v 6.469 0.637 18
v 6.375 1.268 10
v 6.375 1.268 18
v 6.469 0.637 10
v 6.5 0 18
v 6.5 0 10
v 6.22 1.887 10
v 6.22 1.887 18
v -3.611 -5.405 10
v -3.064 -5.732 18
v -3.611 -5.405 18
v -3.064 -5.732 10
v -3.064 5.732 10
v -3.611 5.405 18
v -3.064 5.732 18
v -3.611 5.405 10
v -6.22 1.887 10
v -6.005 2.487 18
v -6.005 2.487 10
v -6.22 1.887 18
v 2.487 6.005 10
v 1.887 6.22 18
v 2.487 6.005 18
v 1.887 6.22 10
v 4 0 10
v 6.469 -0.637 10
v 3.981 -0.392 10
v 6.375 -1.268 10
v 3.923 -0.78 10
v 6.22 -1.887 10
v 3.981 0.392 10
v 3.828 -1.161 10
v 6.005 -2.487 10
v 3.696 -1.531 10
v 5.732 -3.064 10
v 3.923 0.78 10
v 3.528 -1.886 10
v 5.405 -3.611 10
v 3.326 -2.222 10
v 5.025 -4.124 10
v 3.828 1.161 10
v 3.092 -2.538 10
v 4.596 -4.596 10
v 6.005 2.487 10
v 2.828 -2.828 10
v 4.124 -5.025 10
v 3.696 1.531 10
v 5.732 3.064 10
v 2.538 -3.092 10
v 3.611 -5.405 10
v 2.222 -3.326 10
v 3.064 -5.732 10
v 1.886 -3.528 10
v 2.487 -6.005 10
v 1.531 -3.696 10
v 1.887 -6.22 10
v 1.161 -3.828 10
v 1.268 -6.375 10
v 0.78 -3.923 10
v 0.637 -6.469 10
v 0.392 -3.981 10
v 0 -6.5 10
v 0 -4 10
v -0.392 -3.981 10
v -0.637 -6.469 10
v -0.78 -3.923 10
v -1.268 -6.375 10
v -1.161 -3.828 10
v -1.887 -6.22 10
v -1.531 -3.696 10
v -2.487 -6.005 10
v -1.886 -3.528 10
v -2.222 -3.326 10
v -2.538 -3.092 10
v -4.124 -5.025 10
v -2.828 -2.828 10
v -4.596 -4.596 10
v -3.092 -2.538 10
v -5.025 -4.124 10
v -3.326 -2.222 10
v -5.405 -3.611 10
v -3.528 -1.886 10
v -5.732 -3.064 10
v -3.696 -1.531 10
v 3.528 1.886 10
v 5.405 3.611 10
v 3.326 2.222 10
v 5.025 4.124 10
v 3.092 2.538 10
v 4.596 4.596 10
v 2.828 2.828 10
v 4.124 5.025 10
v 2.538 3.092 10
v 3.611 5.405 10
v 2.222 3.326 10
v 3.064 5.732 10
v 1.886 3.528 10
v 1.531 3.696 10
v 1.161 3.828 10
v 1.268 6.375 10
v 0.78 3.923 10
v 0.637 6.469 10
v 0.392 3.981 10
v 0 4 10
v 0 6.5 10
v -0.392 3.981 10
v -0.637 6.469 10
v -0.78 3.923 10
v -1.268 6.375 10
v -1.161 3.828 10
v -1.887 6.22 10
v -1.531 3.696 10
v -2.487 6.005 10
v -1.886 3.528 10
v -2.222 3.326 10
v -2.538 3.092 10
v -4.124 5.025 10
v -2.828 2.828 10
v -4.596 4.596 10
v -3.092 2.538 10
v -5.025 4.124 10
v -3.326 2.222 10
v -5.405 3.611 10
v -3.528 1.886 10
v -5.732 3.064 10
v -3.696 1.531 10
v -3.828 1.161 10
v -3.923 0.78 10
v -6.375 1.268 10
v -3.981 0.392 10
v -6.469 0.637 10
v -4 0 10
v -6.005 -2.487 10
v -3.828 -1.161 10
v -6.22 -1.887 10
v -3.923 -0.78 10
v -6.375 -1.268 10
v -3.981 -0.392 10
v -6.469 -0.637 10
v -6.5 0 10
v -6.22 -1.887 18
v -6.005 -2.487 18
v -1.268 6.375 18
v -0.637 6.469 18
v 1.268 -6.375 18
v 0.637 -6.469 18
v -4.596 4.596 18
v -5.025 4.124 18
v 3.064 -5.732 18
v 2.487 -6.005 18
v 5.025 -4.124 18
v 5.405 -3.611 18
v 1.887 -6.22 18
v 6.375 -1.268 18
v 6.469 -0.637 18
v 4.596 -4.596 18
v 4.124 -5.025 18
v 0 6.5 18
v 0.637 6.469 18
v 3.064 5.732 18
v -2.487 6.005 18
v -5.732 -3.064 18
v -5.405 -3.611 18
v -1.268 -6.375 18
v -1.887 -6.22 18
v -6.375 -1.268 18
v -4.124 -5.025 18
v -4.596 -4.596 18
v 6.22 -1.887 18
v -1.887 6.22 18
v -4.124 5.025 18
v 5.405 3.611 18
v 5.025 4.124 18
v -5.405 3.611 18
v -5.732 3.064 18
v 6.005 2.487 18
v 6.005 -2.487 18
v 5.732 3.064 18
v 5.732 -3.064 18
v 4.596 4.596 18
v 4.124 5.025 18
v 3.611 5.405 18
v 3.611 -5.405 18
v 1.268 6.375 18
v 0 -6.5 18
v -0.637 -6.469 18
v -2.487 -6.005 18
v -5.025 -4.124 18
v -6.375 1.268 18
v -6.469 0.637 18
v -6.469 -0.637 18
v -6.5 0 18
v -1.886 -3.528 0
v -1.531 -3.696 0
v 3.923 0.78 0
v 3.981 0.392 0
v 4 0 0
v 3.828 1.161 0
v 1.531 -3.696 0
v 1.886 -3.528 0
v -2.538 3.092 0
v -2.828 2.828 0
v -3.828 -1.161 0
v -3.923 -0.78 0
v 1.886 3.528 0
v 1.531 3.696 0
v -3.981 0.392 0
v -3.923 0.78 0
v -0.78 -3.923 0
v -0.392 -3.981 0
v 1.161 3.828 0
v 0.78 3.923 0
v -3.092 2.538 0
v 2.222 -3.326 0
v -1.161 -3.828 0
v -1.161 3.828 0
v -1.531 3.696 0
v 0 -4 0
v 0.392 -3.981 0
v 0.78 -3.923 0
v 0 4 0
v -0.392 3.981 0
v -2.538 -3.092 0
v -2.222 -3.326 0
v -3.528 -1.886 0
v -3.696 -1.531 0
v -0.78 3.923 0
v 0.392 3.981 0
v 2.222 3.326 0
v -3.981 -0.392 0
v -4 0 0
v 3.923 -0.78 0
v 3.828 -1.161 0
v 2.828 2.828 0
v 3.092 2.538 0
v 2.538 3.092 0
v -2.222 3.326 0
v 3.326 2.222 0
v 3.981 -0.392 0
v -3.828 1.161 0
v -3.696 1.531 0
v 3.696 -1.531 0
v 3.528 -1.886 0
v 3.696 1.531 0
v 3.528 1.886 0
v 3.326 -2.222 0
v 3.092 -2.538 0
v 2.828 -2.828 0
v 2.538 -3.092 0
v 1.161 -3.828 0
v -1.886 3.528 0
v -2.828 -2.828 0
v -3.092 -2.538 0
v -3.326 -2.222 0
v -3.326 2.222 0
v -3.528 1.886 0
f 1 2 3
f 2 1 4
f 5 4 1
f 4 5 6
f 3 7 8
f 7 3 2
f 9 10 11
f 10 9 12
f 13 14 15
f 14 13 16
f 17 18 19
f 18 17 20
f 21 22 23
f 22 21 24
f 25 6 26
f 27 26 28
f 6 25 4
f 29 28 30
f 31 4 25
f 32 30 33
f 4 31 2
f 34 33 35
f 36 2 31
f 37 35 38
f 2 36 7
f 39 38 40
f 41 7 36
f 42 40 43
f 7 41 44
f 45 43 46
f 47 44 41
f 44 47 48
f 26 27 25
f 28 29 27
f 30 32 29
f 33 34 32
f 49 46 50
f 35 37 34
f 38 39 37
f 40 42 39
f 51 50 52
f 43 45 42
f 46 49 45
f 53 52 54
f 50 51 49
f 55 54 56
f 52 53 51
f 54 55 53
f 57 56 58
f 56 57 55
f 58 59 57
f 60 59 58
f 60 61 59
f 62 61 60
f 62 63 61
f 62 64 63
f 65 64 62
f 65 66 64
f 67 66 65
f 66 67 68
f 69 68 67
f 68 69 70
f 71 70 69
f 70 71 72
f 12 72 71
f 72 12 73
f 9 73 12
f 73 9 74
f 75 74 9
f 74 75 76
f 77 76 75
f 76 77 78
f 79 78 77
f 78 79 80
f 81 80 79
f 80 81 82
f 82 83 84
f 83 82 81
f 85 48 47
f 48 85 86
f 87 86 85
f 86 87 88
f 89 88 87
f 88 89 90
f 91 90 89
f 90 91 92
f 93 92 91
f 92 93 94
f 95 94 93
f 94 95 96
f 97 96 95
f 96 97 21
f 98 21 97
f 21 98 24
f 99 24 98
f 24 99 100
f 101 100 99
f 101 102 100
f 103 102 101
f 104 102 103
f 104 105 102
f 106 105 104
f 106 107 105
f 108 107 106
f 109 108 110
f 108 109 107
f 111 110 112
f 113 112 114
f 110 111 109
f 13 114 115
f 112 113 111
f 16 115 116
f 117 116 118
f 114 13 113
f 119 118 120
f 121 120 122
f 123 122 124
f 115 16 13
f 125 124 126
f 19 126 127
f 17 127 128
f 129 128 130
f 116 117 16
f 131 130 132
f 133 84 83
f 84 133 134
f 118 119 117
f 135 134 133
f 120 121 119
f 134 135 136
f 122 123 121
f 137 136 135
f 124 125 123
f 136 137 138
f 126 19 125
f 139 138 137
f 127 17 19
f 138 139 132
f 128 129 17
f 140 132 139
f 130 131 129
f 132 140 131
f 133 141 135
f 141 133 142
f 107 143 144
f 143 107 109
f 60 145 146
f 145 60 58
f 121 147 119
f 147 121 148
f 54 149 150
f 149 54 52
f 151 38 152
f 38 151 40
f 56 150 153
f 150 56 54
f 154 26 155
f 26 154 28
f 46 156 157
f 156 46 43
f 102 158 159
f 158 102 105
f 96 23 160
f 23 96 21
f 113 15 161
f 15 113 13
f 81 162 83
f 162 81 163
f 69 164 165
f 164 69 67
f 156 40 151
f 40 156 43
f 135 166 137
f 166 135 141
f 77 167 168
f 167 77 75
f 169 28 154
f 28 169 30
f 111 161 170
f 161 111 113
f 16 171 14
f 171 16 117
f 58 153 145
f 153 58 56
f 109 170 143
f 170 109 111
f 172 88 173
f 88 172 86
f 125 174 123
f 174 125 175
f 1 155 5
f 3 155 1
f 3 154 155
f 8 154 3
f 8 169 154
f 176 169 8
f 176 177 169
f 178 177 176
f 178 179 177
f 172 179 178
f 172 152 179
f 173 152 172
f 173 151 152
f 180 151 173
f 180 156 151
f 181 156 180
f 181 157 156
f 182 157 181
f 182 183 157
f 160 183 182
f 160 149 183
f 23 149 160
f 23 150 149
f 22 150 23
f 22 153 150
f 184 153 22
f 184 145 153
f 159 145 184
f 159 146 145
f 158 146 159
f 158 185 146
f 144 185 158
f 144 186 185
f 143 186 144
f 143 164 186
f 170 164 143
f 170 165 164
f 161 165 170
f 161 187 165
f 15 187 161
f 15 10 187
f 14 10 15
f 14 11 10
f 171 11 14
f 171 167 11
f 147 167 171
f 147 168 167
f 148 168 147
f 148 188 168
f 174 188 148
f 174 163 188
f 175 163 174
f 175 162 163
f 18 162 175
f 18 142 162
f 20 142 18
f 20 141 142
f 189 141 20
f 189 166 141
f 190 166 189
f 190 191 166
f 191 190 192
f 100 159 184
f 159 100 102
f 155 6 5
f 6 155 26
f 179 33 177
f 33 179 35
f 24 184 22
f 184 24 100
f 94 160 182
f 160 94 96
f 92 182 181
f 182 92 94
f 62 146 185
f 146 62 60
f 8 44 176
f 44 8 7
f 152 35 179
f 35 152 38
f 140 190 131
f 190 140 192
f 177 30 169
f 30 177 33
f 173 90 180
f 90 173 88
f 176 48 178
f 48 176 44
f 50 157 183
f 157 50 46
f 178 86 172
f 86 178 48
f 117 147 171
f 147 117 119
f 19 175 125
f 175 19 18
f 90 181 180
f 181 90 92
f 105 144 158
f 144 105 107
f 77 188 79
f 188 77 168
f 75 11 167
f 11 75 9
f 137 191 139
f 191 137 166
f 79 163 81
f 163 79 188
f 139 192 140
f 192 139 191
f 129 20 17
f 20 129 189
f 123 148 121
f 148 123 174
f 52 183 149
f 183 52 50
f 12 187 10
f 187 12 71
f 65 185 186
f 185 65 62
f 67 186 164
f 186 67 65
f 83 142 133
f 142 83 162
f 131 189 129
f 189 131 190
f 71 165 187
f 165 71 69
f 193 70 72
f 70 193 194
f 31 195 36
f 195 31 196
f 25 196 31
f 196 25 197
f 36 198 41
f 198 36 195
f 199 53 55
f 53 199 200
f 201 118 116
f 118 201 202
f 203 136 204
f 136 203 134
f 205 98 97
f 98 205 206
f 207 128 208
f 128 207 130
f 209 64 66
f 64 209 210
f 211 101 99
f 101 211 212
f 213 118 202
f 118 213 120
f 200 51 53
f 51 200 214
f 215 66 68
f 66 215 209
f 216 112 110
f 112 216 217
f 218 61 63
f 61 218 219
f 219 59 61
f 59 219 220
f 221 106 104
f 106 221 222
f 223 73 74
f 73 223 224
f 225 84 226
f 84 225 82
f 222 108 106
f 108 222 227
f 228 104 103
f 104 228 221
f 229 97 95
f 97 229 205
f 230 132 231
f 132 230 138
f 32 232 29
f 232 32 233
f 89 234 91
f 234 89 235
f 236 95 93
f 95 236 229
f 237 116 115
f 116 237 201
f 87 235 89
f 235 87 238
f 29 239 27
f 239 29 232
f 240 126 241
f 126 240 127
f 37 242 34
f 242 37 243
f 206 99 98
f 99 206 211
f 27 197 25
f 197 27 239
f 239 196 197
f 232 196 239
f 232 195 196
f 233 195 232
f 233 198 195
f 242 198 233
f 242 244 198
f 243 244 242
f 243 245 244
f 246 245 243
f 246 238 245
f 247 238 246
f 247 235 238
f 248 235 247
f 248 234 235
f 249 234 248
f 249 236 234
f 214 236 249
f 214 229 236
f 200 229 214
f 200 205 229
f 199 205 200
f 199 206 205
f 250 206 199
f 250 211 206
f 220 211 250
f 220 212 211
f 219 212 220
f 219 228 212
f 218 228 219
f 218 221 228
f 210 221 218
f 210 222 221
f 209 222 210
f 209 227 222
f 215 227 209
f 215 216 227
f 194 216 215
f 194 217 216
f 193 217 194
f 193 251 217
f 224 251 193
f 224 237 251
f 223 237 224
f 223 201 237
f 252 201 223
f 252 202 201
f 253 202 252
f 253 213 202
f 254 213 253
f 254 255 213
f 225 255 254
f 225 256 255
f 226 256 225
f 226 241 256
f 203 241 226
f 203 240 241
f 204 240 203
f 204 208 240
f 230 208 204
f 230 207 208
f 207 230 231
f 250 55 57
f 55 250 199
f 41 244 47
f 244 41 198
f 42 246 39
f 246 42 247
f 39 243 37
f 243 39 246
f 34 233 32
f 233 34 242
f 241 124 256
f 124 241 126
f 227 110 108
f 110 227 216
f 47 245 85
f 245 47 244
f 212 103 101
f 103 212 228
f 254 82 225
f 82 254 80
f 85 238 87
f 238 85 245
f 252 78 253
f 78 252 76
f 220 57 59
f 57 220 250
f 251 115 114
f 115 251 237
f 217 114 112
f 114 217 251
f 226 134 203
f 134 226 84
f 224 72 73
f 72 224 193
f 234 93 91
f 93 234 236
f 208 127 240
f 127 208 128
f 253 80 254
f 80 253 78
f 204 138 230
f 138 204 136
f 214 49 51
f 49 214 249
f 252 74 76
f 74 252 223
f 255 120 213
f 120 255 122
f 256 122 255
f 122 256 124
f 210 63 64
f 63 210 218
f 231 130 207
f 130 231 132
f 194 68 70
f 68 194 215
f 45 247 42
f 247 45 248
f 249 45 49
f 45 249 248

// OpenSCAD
module socket_head_cap_screw() {
    union() {
        // Head of the screw
        translate([0, 0, 10])
            cylinder(h=8, d=13, $fn=64);
        
        // Shaft of the screw
        cylinder(h=10, d=8, $fn=64);
        
        // Hex socket
        translate([0, 0, 10])
            cylinder(h=8, d=6, $fn=6);
    }
}

socket_head_cap_screw();
